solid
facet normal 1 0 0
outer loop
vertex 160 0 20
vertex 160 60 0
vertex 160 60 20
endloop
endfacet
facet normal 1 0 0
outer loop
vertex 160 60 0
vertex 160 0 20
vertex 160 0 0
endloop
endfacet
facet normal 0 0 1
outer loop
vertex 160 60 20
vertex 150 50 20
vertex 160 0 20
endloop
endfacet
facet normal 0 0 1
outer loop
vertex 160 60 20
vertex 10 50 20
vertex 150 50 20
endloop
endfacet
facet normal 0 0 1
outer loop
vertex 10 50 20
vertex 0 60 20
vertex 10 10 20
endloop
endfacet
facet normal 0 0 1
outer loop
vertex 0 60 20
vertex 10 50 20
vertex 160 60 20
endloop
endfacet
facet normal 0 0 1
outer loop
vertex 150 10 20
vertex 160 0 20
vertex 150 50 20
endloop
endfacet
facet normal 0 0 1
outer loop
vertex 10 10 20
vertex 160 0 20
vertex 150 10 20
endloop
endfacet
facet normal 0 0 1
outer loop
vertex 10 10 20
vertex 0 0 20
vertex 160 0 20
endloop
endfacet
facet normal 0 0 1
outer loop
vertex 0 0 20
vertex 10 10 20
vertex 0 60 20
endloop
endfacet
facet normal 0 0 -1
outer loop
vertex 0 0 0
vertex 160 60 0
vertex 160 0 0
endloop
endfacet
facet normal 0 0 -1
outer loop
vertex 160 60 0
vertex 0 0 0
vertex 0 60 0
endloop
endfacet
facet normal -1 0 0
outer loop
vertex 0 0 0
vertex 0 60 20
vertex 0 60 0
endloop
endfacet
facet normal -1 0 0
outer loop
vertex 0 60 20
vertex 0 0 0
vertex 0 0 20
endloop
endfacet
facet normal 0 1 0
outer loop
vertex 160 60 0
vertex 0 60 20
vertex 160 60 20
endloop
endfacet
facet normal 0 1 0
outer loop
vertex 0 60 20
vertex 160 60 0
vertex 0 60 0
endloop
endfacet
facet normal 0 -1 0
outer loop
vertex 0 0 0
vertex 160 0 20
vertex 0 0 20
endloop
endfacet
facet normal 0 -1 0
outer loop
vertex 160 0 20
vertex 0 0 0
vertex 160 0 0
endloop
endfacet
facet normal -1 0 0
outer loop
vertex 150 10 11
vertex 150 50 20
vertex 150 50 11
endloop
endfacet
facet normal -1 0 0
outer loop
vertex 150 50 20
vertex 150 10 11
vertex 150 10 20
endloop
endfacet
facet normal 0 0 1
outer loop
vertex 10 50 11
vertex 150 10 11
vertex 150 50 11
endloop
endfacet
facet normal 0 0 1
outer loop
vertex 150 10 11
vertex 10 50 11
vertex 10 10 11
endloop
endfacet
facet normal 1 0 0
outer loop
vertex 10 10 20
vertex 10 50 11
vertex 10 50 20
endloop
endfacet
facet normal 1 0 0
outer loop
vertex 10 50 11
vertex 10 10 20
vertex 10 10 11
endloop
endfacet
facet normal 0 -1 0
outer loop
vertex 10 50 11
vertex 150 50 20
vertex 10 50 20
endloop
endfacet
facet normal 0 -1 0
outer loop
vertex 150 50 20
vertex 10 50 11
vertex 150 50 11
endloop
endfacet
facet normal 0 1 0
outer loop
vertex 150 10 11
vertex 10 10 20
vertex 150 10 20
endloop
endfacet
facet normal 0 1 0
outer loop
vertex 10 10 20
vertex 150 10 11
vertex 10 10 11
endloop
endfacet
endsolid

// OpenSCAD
ridgeoffset = 10;
keyboard_vit = [140, 40,10];

module keyboard_rack(keyboard_vit, ridgeoffset) {
    keyboard_tray = [keyboard_vit[0]+ridgeoffset*2, keyboard_vit[1]+ridgeoffset*2, keyboard_vit[2]+ridgeoffset];
echo(keyboard_tray);
    minkowski() difference() {
        cube(keyboard_tray);
        translate([ridgeoffset,ridgeoffset,keyboard_tray[2]-keyboard_vit[2]+1]) cube(keyboard_vit);
    }
}

keyboard_rack(keyboard_vit, ridgeoffset);
